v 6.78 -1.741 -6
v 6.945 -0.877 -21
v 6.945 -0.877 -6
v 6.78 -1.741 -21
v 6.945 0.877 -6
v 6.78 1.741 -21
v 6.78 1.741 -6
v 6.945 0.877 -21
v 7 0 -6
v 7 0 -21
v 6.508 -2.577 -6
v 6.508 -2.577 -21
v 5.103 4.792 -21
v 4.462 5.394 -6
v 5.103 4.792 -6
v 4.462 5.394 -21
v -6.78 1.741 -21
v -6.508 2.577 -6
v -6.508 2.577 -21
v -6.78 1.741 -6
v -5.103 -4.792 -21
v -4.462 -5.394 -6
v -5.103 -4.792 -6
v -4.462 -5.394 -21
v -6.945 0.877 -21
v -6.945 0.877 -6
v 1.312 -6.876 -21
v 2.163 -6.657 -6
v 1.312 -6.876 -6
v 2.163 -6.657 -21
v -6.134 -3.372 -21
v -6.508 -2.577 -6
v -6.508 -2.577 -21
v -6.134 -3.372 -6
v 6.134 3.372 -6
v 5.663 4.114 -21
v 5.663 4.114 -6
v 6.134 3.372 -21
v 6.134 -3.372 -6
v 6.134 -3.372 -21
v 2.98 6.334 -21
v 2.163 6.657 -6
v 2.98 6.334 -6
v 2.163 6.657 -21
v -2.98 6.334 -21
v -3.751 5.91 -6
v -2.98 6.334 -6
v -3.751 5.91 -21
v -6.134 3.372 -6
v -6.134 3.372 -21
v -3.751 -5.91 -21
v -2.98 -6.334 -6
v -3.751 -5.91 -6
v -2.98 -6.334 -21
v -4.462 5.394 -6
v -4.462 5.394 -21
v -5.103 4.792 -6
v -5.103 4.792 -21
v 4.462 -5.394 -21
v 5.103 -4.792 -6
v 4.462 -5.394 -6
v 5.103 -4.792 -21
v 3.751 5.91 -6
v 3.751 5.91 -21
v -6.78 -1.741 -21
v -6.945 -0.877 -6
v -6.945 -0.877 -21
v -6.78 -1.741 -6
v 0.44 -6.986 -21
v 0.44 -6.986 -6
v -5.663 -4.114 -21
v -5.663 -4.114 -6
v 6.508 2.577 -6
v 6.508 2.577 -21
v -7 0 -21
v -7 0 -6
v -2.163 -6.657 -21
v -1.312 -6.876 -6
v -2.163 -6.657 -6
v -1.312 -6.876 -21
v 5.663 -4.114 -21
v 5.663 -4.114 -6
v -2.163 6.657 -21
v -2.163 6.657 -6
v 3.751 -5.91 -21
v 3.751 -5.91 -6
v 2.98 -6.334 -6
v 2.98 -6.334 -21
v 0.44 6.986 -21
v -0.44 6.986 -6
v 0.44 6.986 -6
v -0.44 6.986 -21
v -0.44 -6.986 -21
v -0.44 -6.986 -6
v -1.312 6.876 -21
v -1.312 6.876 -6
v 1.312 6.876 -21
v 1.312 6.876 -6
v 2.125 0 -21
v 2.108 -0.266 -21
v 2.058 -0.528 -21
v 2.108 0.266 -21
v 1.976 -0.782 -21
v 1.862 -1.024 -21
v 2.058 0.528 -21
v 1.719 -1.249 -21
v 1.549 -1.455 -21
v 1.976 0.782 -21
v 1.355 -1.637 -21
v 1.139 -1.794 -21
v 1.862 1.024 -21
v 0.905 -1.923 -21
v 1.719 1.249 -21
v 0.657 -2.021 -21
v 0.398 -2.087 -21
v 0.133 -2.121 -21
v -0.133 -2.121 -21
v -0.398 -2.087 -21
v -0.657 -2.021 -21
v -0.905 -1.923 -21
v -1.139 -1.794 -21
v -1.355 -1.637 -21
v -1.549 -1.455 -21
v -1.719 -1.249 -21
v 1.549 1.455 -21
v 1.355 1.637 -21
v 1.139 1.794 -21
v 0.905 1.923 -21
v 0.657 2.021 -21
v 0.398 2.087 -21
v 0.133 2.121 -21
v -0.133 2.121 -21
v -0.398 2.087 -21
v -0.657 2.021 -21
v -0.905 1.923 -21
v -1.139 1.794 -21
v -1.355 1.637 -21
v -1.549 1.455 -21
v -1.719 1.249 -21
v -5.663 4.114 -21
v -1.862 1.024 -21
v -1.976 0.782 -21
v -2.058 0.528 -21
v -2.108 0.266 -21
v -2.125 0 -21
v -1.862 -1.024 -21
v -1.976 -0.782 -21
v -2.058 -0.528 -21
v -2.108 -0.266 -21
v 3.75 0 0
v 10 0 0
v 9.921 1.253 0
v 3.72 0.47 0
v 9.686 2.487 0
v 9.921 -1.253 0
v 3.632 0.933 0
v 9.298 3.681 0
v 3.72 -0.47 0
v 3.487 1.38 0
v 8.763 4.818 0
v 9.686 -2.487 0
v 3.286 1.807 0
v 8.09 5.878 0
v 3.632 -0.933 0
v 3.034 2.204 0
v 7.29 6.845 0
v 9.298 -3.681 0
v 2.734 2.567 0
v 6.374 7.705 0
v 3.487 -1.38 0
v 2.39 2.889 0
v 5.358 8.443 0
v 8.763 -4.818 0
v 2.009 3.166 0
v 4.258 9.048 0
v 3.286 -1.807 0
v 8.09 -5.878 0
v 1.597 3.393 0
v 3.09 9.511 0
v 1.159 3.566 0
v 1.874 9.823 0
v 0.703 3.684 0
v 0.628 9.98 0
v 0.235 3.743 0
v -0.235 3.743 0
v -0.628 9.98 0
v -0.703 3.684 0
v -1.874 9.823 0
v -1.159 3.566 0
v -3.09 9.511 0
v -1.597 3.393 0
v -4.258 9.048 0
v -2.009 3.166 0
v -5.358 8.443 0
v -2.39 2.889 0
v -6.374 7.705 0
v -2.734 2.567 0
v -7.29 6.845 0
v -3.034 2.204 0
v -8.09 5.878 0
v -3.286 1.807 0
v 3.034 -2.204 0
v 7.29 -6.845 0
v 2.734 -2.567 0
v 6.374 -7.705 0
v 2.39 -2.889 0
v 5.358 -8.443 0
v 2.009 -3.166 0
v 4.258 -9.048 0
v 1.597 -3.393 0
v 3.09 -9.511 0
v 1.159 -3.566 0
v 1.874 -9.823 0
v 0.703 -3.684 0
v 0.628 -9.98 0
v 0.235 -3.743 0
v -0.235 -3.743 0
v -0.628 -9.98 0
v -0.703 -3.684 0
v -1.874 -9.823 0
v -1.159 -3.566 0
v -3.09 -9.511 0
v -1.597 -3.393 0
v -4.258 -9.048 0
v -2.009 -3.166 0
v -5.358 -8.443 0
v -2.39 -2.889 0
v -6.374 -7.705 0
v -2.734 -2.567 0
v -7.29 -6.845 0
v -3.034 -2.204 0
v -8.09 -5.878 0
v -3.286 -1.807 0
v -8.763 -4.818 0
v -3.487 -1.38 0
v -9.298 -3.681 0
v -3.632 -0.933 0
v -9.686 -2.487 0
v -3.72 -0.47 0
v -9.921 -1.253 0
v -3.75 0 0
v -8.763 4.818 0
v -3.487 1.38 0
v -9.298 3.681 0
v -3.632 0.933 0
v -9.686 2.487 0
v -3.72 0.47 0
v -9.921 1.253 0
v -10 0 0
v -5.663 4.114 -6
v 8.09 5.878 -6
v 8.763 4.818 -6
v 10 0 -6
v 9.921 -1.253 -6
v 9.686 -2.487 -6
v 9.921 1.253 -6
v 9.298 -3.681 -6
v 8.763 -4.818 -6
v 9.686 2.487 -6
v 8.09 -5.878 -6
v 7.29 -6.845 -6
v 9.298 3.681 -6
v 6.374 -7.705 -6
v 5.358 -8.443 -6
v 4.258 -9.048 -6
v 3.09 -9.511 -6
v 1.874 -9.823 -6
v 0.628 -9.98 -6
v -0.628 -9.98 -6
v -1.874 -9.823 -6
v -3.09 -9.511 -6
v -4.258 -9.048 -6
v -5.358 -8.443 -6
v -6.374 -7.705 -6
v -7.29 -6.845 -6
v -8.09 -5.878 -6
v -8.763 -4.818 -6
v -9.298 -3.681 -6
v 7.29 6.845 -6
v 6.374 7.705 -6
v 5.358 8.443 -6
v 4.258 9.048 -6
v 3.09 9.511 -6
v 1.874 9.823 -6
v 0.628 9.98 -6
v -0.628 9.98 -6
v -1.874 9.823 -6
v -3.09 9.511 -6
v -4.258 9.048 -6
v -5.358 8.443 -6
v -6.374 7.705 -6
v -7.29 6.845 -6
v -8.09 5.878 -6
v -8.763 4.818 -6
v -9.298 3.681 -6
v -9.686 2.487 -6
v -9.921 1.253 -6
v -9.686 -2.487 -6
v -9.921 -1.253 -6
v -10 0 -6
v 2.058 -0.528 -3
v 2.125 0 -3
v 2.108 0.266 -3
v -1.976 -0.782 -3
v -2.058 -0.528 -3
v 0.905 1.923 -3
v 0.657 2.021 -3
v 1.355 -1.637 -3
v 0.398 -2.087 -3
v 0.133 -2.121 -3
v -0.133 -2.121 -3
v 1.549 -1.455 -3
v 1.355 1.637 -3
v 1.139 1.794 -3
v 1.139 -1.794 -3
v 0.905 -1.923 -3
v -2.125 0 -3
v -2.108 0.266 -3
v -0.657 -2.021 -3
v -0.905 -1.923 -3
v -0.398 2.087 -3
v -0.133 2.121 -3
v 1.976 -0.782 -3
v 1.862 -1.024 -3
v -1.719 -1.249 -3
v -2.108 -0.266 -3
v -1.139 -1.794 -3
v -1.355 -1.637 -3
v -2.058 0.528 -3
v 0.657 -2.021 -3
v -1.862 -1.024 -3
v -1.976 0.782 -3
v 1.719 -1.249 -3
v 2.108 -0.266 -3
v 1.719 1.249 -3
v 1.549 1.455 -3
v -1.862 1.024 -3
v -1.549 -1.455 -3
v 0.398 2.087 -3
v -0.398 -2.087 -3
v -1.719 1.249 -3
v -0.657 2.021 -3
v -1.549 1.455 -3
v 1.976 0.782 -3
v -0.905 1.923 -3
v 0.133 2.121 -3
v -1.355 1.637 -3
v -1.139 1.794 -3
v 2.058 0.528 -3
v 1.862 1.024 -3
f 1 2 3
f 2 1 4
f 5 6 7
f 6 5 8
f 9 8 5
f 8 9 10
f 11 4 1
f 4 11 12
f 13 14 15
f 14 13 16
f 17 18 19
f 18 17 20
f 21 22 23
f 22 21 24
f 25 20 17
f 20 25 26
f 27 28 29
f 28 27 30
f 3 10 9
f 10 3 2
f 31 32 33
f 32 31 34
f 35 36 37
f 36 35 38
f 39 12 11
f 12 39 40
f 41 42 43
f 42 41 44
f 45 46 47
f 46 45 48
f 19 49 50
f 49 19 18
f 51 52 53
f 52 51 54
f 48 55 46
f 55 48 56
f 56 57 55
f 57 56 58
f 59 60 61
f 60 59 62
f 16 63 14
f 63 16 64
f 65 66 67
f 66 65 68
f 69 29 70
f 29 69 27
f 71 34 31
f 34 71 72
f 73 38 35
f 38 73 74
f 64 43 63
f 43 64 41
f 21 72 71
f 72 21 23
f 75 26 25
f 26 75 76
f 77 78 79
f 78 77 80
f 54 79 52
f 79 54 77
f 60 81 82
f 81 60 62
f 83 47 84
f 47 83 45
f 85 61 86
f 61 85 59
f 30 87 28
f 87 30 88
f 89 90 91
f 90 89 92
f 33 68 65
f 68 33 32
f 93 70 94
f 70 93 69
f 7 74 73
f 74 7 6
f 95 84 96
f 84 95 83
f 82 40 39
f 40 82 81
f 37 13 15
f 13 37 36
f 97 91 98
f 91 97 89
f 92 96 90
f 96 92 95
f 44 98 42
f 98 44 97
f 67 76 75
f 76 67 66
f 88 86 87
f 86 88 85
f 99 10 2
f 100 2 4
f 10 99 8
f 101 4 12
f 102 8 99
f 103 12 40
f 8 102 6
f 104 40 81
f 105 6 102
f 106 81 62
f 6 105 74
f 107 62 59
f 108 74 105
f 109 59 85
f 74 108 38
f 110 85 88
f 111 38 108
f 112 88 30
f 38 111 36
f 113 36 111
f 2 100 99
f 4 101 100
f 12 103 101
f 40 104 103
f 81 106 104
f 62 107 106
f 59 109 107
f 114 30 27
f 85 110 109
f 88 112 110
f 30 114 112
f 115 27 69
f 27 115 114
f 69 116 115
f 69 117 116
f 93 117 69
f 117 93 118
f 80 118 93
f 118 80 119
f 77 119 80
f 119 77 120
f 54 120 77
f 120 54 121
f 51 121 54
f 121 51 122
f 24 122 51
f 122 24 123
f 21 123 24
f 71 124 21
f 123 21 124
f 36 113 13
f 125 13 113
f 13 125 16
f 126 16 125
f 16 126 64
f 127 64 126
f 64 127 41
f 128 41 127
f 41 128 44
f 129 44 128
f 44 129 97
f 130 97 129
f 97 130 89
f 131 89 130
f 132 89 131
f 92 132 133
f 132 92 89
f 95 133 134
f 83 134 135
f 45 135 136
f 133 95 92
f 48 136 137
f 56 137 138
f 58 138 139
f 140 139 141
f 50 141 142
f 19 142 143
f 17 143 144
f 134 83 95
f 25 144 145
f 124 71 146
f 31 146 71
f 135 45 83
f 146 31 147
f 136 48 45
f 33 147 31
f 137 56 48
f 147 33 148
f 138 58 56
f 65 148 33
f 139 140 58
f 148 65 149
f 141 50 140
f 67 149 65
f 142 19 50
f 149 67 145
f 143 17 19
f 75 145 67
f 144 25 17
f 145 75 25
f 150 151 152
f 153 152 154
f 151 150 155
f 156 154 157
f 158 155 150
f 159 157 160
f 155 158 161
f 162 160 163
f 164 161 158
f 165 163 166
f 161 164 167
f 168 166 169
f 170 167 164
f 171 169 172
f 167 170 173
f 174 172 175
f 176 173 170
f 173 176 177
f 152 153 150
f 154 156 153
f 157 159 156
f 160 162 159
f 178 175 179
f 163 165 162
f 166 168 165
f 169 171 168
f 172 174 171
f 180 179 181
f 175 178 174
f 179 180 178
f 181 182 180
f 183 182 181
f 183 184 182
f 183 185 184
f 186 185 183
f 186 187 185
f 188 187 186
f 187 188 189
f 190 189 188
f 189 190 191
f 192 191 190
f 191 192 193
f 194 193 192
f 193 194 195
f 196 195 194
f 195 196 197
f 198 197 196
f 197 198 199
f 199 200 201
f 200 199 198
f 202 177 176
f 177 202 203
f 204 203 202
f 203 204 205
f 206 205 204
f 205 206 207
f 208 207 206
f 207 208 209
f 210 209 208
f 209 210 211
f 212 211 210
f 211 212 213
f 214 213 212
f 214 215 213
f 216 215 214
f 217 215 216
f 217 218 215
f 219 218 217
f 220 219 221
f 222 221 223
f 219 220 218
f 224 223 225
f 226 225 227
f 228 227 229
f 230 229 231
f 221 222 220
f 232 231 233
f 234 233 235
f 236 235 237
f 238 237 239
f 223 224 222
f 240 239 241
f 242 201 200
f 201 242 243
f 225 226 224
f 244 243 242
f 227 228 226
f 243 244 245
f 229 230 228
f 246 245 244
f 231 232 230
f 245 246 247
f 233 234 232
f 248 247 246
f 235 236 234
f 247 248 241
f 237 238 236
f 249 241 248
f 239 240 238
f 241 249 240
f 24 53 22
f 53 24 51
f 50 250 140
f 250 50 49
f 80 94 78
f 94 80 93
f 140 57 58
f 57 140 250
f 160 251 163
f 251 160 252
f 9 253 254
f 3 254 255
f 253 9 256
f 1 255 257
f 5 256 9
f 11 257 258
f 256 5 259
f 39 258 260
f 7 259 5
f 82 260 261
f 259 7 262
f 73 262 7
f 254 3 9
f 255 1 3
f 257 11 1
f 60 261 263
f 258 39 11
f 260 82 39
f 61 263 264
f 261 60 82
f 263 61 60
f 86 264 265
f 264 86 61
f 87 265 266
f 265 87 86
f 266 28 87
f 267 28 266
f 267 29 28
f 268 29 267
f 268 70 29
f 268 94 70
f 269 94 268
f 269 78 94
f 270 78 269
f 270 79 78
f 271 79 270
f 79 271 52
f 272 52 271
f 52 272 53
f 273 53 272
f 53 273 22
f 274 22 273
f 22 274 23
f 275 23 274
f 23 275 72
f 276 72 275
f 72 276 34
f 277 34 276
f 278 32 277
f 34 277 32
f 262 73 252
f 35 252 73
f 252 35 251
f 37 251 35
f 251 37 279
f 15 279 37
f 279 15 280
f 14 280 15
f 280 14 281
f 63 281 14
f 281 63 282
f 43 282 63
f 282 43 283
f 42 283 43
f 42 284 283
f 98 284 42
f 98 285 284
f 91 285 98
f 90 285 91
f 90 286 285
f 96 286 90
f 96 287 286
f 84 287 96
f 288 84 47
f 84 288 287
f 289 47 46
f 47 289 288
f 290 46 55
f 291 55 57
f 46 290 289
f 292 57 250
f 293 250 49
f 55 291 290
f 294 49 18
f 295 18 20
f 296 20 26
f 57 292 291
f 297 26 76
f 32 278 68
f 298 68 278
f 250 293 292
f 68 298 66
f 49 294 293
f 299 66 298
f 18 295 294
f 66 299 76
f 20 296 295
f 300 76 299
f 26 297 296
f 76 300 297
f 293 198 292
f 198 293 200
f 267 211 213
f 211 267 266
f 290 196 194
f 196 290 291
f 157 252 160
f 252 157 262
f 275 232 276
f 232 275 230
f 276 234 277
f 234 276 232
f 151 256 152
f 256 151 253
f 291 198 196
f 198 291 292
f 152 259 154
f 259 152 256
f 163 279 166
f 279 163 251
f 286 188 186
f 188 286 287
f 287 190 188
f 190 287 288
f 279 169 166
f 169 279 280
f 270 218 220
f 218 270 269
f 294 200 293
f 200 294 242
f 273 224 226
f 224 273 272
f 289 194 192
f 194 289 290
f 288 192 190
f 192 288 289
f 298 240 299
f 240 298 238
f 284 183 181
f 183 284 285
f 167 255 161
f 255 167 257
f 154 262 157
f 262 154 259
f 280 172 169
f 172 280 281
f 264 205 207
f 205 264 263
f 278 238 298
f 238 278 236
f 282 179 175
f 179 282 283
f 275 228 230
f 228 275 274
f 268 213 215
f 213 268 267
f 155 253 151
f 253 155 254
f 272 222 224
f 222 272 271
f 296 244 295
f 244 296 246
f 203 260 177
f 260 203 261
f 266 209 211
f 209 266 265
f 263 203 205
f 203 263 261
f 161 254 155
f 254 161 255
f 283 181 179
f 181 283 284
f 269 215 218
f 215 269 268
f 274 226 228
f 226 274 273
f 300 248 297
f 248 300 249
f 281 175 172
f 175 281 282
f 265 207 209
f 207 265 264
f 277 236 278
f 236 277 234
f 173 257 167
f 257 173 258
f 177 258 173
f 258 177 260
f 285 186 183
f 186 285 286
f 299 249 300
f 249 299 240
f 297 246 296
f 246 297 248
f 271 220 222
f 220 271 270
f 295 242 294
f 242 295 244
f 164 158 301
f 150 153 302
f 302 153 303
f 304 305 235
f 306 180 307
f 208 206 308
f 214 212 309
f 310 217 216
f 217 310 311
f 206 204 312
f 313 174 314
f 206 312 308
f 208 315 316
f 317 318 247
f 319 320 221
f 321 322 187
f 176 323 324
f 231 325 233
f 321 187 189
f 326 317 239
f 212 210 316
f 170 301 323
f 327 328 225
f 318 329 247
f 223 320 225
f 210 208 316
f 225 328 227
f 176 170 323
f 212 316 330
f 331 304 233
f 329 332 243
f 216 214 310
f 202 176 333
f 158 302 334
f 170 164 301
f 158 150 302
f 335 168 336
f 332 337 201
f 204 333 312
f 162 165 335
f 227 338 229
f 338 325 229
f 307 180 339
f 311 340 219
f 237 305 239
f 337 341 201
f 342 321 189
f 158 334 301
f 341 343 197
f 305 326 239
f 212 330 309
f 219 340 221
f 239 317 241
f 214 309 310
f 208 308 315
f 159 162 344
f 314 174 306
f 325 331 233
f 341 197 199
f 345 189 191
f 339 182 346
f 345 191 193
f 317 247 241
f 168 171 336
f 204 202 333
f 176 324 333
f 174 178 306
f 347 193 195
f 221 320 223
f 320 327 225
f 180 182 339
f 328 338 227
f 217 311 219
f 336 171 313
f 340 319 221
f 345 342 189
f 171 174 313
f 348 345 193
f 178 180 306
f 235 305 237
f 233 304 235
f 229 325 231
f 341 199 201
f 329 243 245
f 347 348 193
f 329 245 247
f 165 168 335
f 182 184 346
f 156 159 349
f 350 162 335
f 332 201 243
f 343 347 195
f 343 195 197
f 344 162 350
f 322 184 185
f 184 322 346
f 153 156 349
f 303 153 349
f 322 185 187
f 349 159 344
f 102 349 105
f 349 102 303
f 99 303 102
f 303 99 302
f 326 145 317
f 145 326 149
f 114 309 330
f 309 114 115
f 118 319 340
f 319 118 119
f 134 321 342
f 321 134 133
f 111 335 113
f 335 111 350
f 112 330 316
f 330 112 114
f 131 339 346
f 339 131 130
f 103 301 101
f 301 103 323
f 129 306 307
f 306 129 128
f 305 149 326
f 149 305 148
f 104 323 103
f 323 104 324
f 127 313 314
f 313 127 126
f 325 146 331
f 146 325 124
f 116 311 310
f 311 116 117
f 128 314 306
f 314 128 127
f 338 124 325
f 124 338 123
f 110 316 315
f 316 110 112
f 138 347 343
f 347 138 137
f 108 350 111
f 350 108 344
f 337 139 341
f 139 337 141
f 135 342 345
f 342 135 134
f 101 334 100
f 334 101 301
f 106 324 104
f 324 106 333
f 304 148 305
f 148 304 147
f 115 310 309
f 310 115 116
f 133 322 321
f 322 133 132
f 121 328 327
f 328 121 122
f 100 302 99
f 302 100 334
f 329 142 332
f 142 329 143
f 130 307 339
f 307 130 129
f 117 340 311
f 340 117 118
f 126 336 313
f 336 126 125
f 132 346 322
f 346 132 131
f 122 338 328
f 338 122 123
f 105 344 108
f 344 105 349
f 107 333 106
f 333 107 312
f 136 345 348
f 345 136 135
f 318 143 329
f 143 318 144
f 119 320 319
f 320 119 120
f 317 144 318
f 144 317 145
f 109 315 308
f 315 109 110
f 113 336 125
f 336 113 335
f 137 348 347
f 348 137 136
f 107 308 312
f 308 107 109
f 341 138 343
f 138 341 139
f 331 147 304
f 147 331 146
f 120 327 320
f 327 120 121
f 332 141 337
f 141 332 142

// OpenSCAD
$fn = 50;


difference() {
	union() {
		translate(v = [0, 0, -21.0000000000]) {
			cylinder(h = 21, r = 7.0000000000);
		}
		translate(v = [0, 0, -6.0000000000]) {
			cylinder(h = 6, r = 10.0000000000);
		}
	}
	union() {
		translate(v = [0, 0, 0]) {
			rotate(a = [0, 0, 0]) {
				difference() {
					union() {
						#translate(v = [0, 0, -21.0000000000]) {
							cylinder(h = 21, r = 2.0000000000);
						}
						#translate(v = [0, 0, -3]) {
							cylinder(h = 3, r = 7.0000000000, r1 = 2.1250000000, r2 = 3.7500000000);
						}
						#translate(v = [0, 0, -21.0000000000]) {
							cylinder(h = 21, r = 2.1250000000);
						}
						#translate(v = [0, 0, -21.0000000000]) {
							cylinder(h = 21, r = 2.0000000000);
						}
					}
					union();
				}
			}
		}
	}
}
